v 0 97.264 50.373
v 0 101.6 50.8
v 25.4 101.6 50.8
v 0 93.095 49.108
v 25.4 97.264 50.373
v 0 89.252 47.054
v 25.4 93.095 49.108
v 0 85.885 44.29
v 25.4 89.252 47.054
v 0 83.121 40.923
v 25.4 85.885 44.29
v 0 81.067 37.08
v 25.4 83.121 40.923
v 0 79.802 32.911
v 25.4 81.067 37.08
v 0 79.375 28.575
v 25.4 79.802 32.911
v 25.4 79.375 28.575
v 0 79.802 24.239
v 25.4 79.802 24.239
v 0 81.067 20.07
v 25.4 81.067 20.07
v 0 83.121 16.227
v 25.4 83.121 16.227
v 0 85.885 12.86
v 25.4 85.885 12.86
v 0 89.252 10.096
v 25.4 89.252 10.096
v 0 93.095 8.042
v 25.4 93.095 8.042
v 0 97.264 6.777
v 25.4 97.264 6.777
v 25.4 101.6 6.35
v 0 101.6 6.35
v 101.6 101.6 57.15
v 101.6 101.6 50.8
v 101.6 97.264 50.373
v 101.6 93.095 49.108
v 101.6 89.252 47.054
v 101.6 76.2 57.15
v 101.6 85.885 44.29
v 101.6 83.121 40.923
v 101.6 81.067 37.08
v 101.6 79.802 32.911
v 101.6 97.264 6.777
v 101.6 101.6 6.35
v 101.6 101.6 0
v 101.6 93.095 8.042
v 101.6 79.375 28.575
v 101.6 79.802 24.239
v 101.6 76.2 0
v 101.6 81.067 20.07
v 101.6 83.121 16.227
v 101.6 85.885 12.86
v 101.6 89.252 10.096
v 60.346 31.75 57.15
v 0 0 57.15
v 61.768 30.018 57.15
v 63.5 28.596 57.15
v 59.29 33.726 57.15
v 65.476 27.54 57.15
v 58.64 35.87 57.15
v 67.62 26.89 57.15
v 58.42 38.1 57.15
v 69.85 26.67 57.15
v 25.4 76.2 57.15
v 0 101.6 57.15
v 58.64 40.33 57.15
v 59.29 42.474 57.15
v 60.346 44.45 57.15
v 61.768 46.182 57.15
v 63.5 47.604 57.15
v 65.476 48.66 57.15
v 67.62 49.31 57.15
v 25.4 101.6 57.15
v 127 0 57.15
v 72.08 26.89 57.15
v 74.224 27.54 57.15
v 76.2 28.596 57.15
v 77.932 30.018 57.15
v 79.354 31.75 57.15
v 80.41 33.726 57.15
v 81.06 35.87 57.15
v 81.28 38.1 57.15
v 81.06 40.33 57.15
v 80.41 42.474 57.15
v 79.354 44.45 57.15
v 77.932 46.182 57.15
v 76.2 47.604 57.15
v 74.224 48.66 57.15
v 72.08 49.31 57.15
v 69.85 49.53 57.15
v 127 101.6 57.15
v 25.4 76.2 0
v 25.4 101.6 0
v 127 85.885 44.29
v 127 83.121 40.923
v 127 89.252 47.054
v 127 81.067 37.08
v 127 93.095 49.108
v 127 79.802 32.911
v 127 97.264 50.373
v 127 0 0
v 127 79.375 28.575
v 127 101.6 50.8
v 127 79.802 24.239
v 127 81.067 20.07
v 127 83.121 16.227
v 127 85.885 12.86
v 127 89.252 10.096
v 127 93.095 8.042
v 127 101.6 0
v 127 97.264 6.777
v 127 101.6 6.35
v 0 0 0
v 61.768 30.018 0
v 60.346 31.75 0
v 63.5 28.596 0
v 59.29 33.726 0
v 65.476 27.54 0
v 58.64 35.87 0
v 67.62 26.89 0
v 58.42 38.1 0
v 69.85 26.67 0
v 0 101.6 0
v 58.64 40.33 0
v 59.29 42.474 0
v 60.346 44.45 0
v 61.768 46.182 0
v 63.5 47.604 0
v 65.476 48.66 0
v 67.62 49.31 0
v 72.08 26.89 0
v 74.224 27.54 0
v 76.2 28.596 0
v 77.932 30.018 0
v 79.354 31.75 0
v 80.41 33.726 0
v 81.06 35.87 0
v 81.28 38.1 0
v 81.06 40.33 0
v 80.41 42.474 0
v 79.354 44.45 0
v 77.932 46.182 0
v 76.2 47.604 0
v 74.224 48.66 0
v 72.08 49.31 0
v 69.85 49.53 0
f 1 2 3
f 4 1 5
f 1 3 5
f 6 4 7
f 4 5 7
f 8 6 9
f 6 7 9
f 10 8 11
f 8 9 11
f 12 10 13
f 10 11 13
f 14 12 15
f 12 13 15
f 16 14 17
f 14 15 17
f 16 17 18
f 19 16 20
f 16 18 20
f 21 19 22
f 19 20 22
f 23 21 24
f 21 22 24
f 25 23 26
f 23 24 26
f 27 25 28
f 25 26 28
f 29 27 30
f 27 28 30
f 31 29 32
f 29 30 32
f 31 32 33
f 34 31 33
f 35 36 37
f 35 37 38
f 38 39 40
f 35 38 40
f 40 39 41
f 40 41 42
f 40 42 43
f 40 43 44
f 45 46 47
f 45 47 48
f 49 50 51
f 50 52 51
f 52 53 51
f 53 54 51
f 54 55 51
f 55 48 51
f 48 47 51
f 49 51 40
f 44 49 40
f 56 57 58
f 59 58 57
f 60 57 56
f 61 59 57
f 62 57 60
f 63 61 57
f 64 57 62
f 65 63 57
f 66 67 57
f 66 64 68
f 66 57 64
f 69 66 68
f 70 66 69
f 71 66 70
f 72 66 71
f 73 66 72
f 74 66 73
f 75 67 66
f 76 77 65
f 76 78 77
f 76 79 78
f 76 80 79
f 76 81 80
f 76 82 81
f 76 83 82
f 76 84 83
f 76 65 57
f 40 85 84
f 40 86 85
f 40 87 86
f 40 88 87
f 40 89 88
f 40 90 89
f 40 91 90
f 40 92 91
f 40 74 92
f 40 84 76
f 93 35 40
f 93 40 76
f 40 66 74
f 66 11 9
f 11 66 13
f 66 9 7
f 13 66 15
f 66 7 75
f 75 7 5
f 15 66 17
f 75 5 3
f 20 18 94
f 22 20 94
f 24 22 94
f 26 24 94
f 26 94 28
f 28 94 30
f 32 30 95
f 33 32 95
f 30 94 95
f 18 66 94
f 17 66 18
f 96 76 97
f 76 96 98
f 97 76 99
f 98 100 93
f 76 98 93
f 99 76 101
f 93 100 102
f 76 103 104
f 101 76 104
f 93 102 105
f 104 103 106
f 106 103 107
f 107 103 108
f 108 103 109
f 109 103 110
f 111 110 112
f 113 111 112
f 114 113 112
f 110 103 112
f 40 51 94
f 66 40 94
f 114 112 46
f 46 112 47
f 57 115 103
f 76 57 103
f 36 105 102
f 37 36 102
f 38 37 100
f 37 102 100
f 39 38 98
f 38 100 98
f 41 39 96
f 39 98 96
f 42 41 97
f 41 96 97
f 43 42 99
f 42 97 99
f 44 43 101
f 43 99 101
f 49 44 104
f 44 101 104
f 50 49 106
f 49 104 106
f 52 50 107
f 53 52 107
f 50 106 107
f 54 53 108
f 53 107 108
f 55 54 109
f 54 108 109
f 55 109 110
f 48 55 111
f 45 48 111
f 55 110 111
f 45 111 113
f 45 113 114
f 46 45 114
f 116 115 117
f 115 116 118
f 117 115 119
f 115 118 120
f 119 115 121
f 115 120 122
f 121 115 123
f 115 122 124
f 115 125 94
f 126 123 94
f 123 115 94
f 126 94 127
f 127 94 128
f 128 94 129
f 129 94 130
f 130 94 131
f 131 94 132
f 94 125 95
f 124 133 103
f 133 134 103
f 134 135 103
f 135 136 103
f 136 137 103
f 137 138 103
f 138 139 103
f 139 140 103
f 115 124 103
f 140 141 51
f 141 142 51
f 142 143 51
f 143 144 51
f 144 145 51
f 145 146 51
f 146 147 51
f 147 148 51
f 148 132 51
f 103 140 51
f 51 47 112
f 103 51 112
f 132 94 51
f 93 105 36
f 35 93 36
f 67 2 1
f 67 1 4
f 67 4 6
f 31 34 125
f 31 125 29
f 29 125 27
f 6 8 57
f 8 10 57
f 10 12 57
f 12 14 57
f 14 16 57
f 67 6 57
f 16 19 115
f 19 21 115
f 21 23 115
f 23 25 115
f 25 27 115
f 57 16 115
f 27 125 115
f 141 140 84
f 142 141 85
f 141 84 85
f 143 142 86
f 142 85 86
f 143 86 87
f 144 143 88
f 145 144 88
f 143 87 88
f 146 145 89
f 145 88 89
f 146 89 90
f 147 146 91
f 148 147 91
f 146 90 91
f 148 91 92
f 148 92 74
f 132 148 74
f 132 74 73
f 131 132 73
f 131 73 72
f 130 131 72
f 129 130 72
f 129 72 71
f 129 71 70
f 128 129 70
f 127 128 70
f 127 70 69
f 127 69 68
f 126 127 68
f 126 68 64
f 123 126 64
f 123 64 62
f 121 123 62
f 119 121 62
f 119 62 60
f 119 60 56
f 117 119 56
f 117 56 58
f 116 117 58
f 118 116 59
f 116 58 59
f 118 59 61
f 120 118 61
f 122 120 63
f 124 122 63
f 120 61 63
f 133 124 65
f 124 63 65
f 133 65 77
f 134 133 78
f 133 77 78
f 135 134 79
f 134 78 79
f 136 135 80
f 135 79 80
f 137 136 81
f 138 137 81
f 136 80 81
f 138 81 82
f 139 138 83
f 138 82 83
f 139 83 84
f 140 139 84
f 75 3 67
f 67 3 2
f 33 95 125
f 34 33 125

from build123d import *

# Parameters (mm, degrees)
F1_DEPTH = 57.15
F2_R     = 22.225
F3_DEPTH = 127
F4_R     = 11.43
F5_DEPTH = 76.2


with BuildPart() as f1:
    # F0 (on Top) → F1 (new body)
    with BuildSketch(Plane.XY):
        Polygon((0, 101.6), (0, 0), (127, 0), (127, 101.6), (101.6, 101.6), (101.6, 76.2), (25.4, 76.2), (25.4, 101.6), align=None)
    extrude(amount=F1_DEPTH)

    # F2 (on face) → F3 (cut)
    with BuildSketch(Plane.YZ.offset(127)):
        with Locations((101.6, 28.575)):
            Circle(F2_R)
    extrude(amount=-F3_DEPTH, mode=Mode.SUBTRACT)

    # F4 (on face) → F5 (cut)
    with BuildSketch(Plane.XY.offset(57.15)):
        with Locations((69.85, 38.1)):
            Circle(F4_R)
    extrude(amount=-F5_DEPTH, mode=Mode.SUBTRACT)


solid = f1.part
